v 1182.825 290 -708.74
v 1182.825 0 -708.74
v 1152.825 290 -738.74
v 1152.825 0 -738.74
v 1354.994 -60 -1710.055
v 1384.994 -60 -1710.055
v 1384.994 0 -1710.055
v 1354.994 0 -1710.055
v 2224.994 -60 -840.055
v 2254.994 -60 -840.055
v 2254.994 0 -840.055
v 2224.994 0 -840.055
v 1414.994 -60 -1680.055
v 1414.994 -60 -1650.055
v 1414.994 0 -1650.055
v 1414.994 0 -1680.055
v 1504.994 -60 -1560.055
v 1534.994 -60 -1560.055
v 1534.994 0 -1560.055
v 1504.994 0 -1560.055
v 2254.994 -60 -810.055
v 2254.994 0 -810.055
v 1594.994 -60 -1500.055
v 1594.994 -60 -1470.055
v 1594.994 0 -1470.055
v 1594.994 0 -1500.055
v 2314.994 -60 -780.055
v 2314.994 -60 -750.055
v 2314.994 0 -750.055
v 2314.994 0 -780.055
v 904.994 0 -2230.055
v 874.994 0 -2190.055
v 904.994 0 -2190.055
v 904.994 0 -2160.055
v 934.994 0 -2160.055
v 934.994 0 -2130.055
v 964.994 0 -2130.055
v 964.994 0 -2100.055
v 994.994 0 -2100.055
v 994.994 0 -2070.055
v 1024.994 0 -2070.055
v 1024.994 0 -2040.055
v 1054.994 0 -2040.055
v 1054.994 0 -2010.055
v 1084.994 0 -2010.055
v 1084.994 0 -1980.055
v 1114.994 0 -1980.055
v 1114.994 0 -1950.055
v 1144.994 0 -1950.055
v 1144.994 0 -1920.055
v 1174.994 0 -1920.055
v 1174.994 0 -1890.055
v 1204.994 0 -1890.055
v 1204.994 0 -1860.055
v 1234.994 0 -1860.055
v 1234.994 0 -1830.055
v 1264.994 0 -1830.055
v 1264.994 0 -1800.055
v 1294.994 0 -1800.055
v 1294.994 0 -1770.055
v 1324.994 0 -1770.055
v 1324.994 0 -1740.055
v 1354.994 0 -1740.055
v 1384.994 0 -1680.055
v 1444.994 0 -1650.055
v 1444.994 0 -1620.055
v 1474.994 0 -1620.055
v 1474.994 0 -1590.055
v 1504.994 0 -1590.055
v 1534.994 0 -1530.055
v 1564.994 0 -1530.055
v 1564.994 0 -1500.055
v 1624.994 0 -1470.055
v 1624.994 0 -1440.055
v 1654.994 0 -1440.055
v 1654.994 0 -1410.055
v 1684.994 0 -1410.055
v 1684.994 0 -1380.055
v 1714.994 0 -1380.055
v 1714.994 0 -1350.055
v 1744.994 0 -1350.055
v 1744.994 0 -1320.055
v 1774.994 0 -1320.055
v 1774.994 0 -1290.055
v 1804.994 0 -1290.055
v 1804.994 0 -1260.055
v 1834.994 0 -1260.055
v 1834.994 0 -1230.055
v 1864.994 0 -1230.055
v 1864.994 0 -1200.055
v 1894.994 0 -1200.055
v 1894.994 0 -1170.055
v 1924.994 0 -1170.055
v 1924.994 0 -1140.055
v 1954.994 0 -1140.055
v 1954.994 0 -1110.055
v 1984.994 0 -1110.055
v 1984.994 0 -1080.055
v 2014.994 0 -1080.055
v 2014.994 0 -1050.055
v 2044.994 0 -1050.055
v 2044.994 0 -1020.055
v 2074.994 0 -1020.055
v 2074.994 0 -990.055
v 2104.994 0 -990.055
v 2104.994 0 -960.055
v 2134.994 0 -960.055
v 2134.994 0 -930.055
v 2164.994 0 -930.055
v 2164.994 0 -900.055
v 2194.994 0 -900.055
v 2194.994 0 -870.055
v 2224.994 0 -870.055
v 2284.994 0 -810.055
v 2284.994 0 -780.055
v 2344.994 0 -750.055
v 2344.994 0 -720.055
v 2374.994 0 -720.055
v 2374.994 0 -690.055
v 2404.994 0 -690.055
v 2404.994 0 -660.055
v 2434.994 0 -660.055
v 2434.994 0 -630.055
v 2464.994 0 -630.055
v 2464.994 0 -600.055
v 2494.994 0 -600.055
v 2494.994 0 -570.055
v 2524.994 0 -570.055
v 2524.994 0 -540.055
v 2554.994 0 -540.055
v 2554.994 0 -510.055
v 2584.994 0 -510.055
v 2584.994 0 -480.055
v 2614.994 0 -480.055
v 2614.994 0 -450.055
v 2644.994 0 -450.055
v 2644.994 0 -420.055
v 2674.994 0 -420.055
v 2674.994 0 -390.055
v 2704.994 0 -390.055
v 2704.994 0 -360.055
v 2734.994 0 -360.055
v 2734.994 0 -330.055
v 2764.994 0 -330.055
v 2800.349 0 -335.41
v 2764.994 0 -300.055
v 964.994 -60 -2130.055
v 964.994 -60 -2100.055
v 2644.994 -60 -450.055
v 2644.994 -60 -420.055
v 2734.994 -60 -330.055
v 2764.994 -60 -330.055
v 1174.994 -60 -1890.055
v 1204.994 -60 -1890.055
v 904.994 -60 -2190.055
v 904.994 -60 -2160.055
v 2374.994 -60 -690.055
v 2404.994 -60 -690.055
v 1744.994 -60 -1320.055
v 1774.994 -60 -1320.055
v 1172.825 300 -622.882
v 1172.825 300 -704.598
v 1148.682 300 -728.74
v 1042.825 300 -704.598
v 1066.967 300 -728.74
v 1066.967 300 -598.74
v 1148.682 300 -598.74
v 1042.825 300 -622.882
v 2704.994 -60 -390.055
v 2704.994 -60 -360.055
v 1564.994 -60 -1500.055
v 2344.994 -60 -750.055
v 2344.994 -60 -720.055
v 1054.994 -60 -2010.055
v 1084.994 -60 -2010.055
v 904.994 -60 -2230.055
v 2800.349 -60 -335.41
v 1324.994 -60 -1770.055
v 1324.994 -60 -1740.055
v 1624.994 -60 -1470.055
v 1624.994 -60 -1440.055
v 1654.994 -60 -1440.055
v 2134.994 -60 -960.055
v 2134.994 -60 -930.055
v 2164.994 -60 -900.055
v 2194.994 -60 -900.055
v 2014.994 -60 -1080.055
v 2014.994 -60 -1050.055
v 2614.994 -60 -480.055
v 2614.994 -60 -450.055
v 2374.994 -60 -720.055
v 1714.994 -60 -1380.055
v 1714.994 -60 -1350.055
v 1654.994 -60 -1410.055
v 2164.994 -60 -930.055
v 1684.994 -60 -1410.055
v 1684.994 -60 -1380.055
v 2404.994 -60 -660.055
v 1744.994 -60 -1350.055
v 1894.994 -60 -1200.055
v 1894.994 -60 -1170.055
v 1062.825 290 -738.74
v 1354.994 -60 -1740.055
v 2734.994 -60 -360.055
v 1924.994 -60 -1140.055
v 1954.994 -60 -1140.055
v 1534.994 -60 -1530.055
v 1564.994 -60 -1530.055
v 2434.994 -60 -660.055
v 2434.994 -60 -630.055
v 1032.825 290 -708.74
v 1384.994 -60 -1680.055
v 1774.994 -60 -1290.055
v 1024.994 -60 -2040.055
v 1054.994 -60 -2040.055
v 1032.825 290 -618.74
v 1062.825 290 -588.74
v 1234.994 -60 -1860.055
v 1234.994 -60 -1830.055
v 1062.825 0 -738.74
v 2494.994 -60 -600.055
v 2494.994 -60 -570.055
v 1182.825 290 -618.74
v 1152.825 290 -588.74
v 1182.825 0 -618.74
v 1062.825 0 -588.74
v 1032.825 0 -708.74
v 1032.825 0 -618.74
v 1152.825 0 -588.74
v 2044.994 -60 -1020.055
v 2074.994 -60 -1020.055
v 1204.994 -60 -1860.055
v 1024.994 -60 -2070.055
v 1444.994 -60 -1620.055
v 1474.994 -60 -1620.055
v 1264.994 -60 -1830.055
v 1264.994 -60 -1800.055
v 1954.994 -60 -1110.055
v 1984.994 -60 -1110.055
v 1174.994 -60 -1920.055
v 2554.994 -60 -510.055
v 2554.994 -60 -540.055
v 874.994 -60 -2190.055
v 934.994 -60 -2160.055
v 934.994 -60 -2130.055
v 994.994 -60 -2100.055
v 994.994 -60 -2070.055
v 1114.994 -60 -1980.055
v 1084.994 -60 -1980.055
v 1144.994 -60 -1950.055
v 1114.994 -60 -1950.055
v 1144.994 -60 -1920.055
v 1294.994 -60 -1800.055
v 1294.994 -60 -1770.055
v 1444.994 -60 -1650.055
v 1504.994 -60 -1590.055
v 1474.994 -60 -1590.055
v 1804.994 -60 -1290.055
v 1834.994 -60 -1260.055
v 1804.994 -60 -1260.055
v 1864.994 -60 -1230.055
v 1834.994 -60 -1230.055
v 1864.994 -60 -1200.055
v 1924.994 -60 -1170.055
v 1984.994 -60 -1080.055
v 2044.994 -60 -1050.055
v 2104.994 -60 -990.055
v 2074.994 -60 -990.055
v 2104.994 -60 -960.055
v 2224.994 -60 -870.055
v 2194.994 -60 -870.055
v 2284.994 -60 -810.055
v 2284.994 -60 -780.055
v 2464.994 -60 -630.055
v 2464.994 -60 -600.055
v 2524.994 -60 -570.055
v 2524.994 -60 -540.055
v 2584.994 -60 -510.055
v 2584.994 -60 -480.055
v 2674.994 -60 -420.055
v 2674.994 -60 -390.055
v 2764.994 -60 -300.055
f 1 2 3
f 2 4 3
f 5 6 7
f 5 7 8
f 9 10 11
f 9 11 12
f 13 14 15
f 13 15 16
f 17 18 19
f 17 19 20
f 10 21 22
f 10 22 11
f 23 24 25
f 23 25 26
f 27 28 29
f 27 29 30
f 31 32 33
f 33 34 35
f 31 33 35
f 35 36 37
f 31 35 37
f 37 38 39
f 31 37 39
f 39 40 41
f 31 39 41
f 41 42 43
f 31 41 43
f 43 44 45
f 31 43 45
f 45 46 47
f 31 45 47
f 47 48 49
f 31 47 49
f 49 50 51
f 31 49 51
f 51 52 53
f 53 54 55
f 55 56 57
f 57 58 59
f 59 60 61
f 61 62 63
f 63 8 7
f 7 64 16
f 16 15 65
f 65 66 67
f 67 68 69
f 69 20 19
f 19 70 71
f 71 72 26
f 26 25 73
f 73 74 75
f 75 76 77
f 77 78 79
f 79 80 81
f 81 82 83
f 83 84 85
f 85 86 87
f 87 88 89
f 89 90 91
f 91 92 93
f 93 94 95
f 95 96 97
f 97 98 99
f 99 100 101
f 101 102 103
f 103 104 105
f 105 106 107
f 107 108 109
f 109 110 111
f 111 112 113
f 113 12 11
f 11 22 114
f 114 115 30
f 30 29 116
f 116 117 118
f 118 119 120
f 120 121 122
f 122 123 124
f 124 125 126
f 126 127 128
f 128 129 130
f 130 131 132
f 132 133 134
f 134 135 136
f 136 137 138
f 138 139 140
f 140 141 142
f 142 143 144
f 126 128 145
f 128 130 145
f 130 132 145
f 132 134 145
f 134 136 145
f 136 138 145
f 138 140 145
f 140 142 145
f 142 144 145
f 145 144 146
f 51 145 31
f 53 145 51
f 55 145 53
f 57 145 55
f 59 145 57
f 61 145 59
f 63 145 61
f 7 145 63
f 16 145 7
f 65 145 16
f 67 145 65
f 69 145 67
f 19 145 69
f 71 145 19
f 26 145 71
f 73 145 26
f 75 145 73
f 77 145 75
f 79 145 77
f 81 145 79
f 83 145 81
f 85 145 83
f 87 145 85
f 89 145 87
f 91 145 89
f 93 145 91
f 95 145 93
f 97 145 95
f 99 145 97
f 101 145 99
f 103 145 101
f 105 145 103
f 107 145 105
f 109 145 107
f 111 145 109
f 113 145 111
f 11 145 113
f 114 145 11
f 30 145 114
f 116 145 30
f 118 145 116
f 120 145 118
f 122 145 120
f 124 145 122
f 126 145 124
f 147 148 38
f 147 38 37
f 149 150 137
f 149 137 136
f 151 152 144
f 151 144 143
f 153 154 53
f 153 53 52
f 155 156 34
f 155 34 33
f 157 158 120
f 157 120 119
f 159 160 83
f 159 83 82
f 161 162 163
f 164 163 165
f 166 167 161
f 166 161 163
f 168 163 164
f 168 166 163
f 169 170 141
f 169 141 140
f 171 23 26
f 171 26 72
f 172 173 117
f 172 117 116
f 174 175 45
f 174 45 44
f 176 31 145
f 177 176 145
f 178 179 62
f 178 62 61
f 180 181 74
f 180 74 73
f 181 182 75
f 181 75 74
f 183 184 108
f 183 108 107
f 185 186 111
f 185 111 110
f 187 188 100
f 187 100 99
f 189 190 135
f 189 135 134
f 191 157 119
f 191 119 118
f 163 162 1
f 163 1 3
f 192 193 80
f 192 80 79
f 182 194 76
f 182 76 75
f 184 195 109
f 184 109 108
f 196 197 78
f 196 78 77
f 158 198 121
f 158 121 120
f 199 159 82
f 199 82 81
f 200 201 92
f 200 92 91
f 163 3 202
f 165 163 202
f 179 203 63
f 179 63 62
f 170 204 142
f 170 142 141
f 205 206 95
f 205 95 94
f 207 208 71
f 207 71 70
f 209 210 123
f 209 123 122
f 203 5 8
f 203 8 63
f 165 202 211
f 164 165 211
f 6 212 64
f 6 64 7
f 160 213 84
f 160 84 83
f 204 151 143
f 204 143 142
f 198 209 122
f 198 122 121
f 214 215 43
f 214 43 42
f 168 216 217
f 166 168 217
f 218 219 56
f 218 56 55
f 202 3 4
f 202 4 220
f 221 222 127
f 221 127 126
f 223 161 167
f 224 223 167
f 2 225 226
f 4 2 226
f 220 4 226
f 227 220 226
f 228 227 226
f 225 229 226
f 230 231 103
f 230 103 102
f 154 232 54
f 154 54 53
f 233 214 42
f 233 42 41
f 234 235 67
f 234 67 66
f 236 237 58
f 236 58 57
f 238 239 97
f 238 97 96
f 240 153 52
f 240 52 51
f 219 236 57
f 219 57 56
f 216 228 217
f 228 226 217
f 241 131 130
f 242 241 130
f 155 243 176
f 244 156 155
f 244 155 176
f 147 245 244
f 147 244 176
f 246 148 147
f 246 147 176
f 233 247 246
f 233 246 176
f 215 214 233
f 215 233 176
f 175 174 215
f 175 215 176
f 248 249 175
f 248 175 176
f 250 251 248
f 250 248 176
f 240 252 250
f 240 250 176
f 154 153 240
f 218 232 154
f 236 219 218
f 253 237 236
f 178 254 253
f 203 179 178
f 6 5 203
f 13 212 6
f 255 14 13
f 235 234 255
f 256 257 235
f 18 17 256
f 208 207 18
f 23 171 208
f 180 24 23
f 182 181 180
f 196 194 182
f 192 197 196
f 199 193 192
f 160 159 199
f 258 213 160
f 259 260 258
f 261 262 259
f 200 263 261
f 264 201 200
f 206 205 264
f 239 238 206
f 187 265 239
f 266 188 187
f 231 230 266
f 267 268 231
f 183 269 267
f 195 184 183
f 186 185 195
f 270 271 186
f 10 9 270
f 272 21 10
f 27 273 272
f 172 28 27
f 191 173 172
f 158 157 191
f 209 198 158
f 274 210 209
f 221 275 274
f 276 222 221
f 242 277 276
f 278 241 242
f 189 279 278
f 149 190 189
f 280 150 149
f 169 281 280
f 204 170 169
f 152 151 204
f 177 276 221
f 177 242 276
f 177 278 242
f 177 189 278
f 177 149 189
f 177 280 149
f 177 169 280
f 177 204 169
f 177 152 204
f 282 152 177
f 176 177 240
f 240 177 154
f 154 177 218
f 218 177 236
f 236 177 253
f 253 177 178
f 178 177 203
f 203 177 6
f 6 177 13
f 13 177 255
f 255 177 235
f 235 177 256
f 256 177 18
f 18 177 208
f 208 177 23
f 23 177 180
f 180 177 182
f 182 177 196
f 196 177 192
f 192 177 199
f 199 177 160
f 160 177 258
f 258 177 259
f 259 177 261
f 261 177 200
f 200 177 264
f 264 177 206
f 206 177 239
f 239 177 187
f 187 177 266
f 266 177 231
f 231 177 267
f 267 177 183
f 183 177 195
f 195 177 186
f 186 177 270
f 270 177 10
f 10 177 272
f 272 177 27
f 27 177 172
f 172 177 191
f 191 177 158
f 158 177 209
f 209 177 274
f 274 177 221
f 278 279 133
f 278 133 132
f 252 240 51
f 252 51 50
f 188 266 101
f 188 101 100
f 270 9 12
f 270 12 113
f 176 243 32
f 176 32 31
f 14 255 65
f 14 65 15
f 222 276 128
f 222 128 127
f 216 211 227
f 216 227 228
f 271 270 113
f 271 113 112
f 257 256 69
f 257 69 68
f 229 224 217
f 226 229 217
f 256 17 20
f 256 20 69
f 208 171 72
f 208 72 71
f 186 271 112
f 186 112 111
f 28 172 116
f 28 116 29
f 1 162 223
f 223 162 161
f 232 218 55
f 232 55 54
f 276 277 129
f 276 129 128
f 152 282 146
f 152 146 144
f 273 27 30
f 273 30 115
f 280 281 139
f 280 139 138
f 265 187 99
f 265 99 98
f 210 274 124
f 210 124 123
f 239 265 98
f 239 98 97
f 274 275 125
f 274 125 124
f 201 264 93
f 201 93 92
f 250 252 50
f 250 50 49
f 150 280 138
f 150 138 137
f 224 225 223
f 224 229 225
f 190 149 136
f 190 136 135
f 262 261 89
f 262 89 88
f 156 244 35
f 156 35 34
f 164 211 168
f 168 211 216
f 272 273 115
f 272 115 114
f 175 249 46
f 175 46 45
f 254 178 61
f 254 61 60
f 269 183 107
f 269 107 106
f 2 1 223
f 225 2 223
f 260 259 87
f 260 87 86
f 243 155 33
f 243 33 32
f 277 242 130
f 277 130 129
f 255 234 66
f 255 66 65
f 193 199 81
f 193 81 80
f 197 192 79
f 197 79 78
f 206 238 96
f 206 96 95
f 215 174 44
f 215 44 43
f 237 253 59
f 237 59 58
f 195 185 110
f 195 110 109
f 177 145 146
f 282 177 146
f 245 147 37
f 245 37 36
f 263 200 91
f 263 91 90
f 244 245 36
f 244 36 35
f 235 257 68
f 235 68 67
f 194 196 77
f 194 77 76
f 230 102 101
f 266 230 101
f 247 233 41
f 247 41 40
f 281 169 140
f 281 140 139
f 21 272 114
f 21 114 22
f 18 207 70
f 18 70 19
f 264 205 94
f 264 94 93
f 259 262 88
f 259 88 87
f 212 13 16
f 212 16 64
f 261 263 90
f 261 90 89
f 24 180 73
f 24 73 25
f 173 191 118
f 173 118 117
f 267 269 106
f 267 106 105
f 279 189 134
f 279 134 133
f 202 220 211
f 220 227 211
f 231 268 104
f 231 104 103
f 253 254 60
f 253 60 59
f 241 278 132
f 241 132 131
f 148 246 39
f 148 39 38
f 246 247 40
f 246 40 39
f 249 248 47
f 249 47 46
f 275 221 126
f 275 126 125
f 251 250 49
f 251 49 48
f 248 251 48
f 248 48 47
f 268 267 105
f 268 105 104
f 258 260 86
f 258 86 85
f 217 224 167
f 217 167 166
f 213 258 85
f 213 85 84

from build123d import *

# Parameters (mm, degrees)
F1_DEPTH = 60
F2_W     = 150
F2_H     = 150
F3_DEPTH = 300
F4_SIZE  = 30
F5_SIZE  = 10


with BuildPart() as f1:
    # F0 (on Front) → F1 (new body)
    with BuildSketch(Plane.XZ):
        Polygon((2764.9939799309, -330.0551319122), (2734.9939799309, -330.0551319122), (2734.9939799309, -360.0551319122), (2704.9939799309, -360.0551319122), (2704.9939799309, -390.0551319122), (2674.9939799309, -390.0551319122), (2674.9939799309, -420.0551319122), (2644.9939799309, -420.0551319122), (2644.9939799309, -450.0551319122), (2614.9939799309, -450.0551319122), (2614.9939799309, -480.0551319122), (2584.9939799309, -480.0551319122), (2584.9939799309, -510.0551319122), (2554.9939799309, -510.0551319122), (2554.9939799309, -540.0551319122), (2524.9939799309, -540.0551319122), (2524.9939799309, -570.0551319122), (2494.9939799309, -570.0551319122), (2494.9939799309, -600.0551319122), (2464.9939799309, -600.0551319122), (2464.9939799309, -630.0551319122), (2434.9939799309, -630.0551319122), (2434.9939799309, -660.0551319122), (2404.9939799309, -660.0551319122), (2404.9939799309, -690.0551319122), (2374.9939799309, -690.0551319122), (2374.9939799309, -720.0551319122), (2344.9939799309, -720.0551319122), (2344.9939799309, -750.0551319122), (2314.9939799309, -750.0551319122), (2314.9939799309, -780.0551319122), (2284.9939799309, -780.0551319122), (2284.9939799309, -810.0551319122), (2254.9939799309, -810.0551319122), (2254.9939799309, -840.0551319122), (2224.9939799309, -840.0551319122), (2224.9939799309, -870.0551319122), (2194.9939799309, -870.0551319122), (2194.9939799309, -900.0551319122), (2164.9939799309, -900.0551319122), (2164.9939799309, -930.0551319122), (2134.9939799309, -930.0551319122), (2134.9939799309, -960.0551319122), (2104.9939799309, -960.0551319122), (2104.9939799309, -990.0551319122), (2074.9939799309, -990.0551319122), (2074.9939799309, -1020.0551319122), (2044.9939799309, -1020.0551319122), (2044.9939799309, -1050.0551319122), (2014.9939799309, -1050.0551319122), (2014.9939799309, -1080.0551319122), (1984.9939799309, -1080.0551319122), (1984.9939799309, -1110.0551319122), (1954.9939799309, -1110.0551319122), (1954.9939799309, -1140.0551319122), (1924.9939799309, -1140.0551319122), (1924.9939799309, -1170.0551319122), (1894.9939799309, -1170.0551319122), (1894.9939799309, -1200.0551319122), (1864.9939799309, -1200.0551319122), (1864.9939799309, -1230.0551319122), (1834.9939799309, -1230.0551319122), (1834.9939799309, -1260.0551319122), (1804.9939799309, -1260.0551319122), (1804.9939799309, -1290.0551319122), (1774.9939799309, -1290.0551319122), (1774.9939799309, -1320.0551319122), (1744.9939799309, -1320.0551319122), (1744.9939799309, -1350.0551319122), (1714.9939799309, -1350.0551319122), (1714.9939799309, -1380.0551319122), (1684.9939799309, -1380.0551319122), (1684.9939799309, -1410.0551319122), (1654.9939799309, -1410.0551319122), (1654.9939799309, -1440.0551319122), (1624.9939799309, -1440.0551319122), (1624.9939799309, -1470.0551319122), (1594.9939799309, -1470.0551319122), (1594.9939799309, -1500.0551319122), (1564.9939799309, -1500.0551319122), (1564.9939799309, -1530.0551319122), (1534.9939799309, -1530.0551319122), (1534.9939799309, -1560.0551319122), (1504.9939799309, -1560.0551319122), (1504.9939799309, -1590.0551319122), (1474.9939799309, -1590.0551319122), (1474.9939799309, -1620.0551319122), (1444.9939799309, -1620.0551319122), (1444.9939799309, -1650.0551319122), (1414.9939799309, -1650.0551319122), (1414.9939799309, -1680.0551319122), (1384.9939799309, -1680.0551319122), (1384.9939799309, -1710.0551319122), (1354.9939799309, -1710.0551319122), (1354.9939799309, -1740.0551319122), (1324.9939799309, -1740.0551319122), (1324.9939799309, -1770.0551319122), (1294.9939799309, -1770.0551319122), (1294.9939799309, -1800.0551319122), (1264.9939799309, -1800.0551319122), (1264.9939799309, -1830.0551319122), (1234.9939799309, -1830.0551319122), (1234.9939799309, -1860.0551319122), (1204.9939799309, -1860.0551319122), (1204.9939799309, -1890.0551319122), (1174.9939799309, -1890.0551319122), (1174.9939799309, -1920.0551319122), (1144.9939799309, -1920.0551319122), (1144.9939799309, -1950.0551319122), (1114.9939799309, -1950.0551319122), (1114.9939799309, -1980.0551319122), (1084.9939799309, -1980.0551319122), (1084.9939799309, -2010.0551319122), (1054.9939799309, -2010.0551319122), (1054.9939799309, -2040.0551319122), (1024.9939799309, -2040.0551319122), (1024.9939799309, -2070.0551319122), (994.9939799309, -2070.0551319122), (994.9939799309, -2100.0551319122), (964.9939799309, -2100.0551319122), (964.9939799309, -2130.0551319122), (934.9939799309, -2130.0551319122), (934.9939799309, -2160.0551319122), (904.9939799309, -2160.0551319122), (904.9939799309, -2190.0551319122), (874.9939799309, -2190.0551319122), (904.9939799309, -2230.0551319122), (2800.3493189902, -335.4104709716), (2764.9939799309, -300.0551319122), align=None)
    extrude(amount=F1_DEPTH)


with BuildPart() as f3:
    # F2 (on face) → F3 (new body)
    with BuildSketch(Plane(origin=(0, 0, 0), x_dir=(-1, 0, 0), z_dir=(0, 1, 0))):
        with Locations((-1107.8245520592, -663.7402057648)):
            Rectangle(F2_W, F2_H)
    extrude(amount=F3_DEPTH)

    # F4
    f4_edges = [f3.edges().sort_by_distance(p)[0] for p in [
        (1182.824552, 150, -588.740206),
        (1032.824552, 150, -588.740206),
        (1182.824552, 150, -738.740206),
        (1032.824552, 150, -738.740206),
    ]]
    chamfer(f4_edges, length=F4_SIZE)

    # F5
    f5_edges = [f3.edges().sort_by_distance(p)[0] for p in [
        (1107.824552, 300, -588.740206),
        (1032.824552, 300, -663.740206),
        (1107.824552, 300, -738.740206),
        (1182.824552, 300, -663.740206),
        (1047.824552, 300, -603.740206),
        (1167.824552, 300, -603.740206),
        (1167.824552, 300, -723.740206),
        (1047.824552, 300, -723.740206),
    ]]
    chamfer(f5_edges, length=F5_SIZE)


solid = Compound([f1.part, f3.part])
